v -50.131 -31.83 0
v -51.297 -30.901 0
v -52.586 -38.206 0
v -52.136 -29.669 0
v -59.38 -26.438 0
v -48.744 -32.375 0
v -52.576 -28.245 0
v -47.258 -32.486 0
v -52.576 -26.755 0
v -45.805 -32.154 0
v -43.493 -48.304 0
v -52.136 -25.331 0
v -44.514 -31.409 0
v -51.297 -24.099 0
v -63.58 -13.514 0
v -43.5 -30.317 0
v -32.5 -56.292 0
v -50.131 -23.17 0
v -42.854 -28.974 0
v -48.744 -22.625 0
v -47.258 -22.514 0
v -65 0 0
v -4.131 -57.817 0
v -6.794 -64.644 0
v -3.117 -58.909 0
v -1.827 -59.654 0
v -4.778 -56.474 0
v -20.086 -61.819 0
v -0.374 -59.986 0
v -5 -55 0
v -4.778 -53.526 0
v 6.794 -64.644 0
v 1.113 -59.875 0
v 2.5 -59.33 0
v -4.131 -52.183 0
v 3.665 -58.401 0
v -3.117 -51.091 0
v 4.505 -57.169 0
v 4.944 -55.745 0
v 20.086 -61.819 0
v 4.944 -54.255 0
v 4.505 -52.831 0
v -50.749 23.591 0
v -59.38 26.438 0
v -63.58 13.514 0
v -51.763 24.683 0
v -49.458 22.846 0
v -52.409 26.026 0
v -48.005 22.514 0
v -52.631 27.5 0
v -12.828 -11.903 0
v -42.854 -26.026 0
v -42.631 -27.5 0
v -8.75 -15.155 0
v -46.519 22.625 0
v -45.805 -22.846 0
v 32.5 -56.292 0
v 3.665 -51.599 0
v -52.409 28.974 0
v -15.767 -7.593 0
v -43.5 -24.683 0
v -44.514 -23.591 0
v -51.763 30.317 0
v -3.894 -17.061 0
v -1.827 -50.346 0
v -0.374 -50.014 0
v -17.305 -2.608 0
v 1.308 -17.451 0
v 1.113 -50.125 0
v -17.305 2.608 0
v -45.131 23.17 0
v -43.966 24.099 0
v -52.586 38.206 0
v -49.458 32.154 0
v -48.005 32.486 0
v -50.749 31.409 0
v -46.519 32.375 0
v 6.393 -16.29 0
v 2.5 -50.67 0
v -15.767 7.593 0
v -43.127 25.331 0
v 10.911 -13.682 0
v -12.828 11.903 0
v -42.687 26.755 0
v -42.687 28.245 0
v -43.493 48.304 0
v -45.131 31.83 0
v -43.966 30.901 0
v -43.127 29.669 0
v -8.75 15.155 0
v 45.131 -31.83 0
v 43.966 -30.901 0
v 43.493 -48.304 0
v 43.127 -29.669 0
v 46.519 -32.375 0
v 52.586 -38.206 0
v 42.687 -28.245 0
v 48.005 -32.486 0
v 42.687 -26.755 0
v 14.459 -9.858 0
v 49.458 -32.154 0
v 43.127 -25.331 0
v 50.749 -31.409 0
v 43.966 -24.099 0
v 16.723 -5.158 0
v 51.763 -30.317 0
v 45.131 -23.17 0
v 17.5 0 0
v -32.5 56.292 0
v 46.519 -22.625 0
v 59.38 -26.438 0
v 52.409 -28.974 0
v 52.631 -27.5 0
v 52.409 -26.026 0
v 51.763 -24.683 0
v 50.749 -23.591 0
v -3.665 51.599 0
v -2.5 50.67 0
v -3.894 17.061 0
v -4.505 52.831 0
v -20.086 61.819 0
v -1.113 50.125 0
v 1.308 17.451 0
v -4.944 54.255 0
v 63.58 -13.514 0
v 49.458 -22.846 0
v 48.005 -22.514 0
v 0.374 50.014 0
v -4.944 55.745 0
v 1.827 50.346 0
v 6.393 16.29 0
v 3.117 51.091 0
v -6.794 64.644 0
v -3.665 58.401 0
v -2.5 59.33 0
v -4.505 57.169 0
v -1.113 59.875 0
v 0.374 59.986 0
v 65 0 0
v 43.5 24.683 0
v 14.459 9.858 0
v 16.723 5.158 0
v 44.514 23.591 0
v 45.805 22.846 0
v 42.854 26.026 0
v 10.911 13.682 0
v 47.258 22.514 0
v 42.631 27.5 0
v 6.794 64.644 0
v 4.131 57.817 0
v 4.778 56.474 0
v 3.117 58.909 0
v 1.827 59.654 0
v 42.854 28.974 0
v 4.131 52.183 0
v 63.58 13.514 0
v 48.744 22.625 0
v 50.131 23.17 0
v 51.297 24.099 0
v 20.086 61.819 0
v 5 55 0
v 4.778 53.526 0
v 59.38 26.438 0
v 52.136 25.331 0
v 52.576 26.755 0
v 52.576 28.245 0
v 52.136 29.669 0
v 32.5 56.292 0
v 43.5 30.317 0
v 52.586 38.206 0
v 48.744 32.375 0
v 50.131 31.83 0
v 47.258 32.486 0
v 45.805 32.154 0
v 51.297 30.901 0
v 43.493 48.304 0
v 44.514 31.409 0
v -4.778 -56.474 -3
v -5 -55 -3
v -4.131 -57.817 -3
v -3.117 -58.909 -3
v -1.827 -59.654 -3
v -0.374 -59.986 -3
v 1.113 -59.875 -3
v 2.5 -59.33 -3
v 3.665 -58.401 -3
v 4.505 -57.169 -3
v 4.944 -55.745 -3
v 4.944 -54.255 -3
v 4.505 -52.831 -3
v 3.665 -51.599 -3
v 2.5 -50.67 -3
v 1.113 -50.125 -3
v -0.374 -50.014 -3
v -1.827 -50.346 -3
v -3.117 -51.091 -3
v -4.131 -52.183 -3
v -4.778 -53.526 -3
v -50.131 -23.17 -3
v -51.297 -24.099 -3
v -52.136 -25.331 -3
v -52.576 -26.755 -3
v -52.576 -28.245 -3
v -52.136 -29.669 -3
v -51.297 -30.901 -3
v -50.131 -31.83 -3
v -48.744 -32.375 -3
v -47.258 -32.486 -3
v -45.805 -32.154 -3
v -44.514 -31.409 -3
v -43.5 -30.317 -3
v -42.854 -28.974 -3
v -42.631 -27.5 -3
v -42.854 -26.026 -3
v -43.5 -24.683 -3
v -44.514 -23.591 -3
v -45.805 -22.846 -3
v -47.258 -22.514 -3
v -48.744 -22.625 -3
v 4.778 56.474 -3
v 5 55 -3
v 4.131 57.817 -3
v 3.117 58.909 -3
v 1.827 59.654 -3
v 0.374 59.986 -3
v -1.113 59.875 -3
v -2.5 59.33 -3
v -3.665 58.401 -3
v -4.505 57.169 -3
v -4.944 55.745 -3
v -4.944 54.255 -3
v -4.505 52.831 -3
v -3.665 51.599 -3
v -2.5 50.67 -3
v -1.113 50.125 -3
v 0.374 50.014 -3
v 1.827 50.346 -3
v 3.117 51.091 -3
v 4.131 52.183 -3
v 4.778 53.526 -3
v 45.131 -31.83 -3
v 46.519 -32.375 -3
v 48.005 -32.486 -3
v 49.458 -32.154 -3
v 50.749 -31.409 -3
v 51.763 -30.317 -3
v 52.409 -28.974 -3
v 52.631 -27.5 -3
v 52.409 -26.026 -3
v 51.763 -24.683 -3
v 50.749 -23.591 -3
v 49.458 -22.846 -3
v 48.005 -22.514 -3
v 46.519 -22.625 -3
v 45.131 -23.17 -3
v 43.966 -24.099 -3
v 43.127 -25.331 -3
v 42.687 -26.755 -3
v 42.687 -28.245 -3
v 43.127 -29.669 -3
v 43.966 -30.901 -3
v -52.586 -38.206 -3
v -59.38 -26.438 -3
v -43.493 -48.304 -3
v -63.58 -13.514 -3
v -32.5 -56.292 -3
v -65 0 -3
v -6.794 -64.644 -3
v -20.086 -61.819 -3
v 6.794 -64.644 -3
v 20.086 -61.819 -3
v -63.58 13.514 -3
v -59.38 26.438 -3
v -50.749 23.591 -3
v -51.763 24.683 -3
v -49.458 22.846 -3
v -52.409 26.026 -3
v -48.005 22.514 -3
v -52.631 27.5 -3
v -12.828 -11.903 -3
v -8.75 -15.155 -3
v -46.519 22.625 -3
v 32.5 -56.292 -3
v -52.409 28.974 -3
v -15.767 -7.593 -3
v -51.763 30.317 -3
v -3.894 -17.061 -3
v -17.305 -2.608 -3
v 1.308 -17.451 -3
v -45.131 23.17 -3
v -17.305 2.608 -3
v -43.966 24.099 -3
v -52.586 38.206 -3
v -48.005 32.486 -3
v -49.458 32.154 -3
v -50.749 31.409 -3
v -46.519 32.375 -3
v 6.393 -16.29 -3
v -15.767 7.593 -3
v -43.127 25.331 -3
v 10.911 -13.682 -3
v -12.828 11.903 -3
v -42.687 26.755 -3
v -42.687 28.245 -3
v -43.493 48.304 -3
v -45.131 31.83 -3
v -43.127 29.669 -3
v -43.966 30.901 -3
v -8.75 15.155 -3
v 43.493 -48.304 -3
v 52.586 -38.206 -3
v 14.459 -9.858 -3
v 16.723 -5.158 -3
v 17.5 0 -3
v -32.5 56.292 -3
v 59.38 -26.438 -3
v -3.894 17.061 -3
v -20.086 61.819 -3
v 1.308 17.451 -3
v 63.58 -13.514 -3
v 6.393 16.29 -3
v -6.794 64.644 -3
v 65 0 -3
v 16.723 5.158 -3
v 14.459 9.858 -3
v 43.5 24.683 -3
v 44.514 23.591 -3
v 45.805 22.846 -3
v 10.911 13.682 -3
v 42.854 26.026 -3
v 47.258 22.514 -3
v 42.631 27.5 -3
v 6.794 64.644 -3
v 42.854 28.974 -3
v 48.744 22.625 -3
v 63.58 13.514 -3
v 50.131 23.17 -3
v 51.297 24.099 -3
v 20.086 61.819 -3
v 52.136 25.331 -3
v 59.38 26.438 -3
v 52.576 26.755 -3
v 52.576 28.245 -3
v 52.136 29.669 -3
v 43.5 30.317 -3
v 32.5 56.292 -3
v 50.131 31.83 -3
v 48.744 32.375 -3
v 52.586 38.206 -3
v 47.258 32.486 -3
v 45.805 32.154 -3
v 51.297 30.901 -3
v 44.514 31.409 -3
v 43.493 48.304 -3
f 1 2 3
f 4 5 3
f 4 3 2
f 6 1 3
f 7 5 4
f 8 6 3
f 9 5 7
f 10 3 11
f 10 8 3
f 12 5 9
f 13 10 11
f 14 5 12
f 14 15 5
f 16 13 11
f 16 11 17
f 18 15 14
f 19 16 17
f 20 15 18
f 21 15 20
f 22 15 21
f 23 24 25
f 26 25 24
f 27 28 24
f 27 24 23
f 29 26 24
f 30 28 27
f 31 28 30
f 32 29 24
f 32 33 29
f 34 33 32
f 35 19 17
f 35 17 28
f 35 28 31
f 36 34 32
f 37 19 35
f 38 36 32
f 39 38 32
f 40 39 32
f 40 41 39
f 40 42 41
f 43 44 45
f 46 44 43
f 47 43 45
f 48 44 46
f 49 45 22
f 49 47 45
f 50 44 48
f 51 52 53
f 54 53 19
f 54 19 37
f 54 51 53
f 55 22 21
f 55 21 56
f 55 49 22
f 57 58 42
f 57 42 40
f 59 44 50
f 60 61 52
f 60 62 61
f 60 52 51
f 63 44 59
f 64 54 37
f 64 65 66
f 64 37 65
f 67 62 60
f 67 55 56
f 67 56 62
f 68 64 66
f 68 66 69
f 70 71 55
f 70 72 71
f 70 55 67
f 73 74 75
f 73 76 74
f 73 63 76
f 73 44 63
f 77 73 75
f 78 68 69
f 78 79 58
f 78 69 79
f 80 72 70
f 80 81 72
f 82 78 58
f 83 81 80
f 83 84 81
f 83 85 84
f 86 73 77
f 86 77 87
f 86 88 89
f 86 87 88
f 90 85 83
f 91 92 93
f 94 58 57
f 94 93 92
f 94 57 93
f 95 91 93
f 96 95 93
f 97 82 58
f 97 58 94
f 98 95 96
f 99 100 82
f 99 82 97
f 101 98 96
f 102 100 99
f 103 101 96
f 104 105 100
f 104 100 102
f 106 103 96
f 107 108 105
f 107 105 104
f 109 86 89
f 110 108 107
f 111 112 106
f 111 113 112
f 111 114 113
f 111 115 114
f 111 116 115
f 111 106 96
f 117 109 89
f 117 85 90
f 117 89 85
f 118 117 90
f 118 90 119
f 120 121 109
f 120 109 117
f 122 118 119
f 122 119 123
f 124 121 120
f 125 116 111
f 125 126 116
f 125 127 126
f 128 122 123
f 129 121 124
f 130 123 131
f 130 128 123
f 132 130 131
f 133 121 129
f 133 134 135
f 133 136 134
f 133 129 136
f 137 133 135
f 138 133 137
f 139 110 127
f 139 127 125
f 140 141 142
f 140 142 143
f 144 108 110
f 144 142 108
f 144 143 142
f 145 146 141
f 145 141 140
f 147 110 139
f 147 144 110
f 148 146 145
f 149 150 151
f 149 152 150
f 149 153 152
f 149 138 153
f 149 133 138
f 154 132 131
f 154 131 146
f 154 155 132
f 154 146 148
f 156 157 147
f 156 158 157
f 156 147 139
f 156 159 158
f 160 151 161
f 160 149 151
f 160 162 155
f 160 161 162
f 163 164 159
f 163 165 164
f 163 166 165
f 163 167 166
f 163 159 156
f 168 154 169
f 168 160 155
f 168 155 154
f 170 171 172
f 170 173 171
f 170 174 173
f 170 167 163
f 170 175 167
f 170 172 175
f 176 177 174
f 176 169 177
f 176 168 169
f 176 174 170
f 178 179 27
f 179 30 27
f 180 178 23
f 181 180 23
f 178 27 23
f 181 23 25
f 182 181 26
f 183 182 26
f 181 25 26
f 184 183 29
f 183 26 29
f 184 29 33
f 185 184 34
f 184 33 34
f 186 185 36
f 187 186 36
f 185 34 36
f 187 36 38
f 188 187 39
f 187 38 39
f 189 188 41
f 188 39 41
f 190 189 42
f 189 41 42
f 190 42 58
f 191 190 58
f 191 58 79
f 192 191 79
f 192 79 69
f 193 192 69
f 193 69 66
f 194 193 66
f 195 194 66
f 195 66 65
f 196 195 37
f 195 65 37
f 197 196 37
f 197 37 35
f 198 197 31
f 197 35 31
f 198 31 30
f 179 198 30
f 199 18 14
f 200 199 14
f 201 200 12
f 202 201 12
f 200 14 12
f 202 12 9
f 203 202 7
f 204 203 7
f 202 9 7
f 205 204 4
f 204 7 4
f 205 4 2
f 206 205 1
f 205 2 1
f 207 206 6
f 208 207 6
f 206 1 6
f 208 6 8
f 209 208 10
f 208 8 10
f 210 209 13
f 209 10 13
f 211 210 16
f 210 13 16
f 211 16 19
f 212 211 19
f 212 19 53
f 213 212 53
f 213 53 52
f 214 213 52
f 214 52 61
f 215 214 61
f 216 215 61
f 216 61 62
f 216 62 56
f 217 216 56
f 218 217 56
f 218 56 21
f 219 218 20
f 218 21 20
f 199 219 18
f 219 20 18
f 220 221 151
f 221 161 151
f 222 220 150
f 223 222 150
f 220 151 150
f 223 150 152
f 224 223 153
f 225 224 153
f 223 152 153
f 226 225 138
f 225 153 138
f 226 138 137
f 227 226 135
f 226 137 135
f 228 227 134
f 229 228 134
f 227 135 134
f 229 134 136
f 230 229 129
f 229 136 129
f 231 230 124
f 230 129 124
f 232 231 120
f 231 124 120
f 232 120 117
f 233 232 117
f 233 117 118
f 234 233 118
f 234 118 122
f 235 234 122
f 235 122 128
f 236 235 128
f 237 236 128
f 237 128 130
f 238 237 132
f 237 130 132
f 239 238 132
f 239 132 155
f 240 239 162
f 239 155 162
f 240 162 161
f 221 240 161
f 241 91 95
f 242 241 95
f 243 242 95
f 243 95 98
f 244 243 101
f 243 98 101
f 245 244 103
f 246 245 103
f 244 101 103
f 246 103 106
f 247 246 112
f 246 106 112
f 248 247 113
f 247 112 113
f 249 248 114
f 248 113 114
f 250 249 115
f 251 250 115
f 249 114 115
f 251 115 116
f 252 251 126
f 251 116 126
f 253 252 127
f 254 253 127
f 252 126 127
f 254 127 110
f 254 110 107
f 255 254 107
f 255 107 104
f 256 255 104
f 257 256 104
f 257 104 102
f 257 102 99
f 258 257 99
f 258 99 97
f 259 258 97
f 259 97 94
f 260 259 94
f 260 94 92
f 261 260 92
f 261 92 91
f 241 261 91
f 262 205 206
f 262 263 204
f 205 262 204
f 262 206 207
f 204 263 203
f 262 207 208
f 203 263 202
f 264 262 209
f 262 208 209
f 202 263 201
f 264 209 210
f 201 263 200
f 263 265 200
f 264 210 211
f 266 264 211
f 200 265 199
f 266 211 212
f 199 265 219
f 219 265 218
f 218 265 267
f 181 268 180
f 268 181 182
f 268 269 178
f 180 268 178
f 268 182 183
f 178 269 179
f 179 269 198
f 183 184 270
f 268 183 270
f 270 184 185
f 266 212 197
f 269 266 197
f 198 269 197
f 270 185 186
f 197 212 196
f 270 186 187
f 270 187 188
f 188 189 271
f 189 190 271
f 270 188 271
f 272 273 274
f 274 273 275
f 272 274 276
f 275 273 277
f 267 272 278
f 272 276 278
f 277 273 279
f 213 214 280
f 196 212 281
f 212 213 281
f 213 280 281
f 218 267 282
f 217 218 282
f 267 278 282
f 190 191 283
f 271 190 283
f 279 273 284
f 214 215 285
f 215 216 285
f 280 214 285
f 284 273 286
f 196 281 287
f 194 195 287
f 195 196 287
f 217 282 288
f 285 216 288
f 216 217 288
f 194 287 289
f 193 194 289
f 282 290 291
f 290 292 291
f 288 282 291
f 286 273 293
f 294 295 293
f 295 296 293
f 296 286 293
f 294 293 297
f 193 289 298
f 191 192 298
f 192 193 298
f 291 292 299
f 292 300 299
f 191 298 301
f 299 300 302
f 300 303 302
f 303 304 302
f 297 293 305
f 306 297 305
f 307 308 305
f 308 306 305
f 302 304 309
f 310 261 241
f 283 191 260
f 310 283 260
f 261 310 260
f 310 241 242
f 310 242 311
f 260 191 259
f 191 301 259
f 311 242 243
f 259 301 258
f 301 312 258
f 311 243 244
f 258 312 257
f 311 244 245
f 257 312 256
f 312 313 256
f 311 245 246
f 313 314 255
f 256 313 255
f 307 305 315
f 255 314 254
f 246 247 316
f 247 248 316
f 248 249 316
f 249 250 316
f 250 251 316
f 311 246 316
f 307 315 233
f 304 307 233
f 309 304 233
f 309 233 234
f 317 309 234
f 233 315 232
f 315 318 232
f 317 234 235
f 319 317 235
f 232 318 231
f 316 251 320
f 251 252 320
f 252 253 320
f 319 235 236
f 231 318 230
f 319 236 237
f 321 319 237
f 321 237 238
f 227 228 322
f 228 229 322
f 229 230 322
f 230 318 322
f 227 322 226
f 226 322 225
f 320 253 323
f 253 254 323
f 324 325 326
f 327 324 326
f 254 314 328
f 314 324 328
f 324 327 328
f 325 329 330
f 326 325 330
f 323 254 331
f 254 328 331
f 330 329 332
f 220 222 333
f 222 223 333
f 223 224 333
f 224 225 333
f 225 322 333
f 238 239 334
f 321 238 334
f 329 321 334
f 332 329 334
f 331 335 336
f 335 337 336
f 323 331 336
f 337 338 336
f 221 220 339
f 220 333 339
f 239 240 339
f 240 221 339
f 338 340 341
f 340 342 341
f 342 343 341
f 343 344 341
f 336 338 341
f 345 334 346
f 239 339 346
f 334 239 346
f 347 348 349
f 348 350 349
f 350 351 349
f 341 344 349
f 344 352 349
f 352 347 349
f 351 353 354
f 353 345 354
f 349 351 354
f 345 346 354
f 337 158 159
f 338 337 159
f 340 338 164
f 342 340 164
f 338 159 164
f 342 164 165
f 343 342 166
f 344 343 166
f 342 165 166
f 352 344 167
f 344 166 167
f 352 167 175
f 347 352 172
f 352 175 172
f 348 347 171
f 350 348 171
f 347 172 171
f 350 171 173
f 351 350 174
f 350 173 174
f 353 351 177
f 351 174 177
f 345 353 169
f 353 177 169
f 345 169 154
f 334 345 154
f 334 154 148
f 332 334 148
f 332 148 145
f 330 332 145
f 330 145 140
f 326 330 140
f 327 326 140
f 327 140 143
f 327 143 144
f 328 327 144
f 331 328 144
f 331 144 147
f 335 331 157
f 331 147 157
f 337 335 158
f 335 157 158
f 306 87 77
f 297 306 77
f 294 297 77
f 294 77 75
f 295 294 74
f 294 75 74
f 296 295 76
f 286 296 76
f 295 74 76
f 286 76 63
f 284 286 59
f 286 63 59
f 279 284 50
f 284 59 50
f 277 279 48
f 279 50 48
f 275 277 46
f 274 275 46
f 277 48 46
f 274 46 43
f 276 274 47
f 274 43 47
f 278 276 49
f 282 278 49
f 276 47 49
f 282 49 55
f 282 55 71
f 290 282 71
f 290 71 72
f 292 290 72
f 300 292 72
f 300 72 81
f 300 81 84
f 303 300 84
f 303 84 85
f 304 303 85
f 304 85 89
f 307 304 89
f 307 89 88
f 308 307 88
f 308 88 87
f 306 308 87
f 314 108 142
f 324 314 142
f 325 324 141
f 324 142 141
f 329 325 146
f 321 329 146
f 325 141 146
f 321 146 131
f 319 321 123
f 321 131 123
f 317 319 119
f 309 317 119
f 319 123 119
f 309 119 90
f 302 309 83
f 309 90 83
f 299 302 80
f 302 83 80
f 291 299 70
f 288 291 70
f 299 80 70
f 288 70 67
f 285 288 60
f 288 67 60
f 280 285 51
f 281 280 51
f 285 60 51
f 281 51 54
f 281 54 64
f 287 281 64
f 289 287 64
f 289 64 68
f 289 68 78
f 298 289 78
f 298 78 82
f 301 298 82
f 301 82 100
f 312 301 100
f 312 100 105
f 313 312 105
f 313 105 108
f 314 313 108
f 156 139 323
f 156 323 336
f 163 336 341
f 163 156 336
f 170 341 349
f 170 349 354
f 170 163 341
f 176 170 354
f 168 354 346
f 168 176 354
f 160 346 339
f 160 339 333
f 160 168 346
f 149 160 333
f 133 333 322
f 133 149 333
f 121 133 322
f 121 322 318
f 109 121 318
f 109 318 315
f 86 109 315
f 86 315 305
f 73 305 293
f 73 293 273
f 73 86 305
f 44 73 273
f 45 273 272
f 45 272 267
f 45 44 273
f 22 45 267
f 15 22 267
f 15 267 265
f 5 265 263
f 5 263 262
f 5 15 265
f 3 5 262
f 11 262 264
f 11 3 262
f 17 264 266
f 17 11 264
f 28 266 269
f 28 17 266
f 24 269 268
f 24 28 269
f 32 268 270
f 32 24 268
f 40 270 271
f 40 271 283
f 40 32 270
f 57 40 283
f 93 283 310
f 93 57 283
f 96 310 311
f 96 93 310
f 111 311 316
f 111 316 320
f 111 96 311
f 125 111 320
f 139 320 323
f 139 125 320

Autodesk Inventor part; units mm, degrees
ref_plane "YZ Plane" through (0, 0, 0) normal (1, 0, 0) x (0, 1, 0)
ref_plane "XZ Plane" through (0, 0, 0) normal (0, 1, 0) x (-1, 0, 0)
ref_plane "XY Plane" through (0, 0, 0) normal (0, 0, 1) x (1, 0, 0)
sketch "Sketch1" plane through (0, 0, 0) normal (0, 0, 1) x (1, 0, 0)
  circle A0 centre (0, 0) radius 65
  dimension "d0" = 130
extrude "Plate1" add sketch "Sketch1" against normal blind 3
sketch "Sketch2" plane through (0, 0, 0) normal (0, 0, 1) x (1, 0, 0)
  circle A0 centre (0, 55) radius 5
  circle A1 centre (0, 0) radius 65 projected
  dimension "d2" = 10
  dimension "d3" = 55
extrude "Cut1" cut sketch "Sketch2" against normal through all contours A0
pattern_circular "Circular Pattern1" count 6 over 360 about axis through (0, 0, 0) along (0, 0, -1) of "Cut1"
sketch "Sketch3" plane through (0, 0, 0) normal (0, 0, 1) x (1, 0, 0)
  circle A0 centre (0, 0) radius 17.5
  dimension "d9" = 35
extrude "Extrusion1" cut sketch "Sketch3" against normal through all
equation "\"d4\" = Thickness"
equation "\"d1\" = Thickness"
equation "\"BendReliefWidth\" = Thickness"
equation "\"BendReliefDepth\" = 0.5 * Thickness"
equation "\"CornerReliefSize\" = 4 * Thickness"
equation "\"MinimumRemnant\" = 2 * Thickness"
equation "\"TransitionRadius\" = BendRadius"
equation "\"JacobiRadiusSize\" = BendRadius"
equation "\"GapSize\" = Thickness"
equation "\"Thickness\" = 3"
equation "\"BendRadius\" = 2.75"
properties part number "TRM 041 flange" material "Stainless Steel"
